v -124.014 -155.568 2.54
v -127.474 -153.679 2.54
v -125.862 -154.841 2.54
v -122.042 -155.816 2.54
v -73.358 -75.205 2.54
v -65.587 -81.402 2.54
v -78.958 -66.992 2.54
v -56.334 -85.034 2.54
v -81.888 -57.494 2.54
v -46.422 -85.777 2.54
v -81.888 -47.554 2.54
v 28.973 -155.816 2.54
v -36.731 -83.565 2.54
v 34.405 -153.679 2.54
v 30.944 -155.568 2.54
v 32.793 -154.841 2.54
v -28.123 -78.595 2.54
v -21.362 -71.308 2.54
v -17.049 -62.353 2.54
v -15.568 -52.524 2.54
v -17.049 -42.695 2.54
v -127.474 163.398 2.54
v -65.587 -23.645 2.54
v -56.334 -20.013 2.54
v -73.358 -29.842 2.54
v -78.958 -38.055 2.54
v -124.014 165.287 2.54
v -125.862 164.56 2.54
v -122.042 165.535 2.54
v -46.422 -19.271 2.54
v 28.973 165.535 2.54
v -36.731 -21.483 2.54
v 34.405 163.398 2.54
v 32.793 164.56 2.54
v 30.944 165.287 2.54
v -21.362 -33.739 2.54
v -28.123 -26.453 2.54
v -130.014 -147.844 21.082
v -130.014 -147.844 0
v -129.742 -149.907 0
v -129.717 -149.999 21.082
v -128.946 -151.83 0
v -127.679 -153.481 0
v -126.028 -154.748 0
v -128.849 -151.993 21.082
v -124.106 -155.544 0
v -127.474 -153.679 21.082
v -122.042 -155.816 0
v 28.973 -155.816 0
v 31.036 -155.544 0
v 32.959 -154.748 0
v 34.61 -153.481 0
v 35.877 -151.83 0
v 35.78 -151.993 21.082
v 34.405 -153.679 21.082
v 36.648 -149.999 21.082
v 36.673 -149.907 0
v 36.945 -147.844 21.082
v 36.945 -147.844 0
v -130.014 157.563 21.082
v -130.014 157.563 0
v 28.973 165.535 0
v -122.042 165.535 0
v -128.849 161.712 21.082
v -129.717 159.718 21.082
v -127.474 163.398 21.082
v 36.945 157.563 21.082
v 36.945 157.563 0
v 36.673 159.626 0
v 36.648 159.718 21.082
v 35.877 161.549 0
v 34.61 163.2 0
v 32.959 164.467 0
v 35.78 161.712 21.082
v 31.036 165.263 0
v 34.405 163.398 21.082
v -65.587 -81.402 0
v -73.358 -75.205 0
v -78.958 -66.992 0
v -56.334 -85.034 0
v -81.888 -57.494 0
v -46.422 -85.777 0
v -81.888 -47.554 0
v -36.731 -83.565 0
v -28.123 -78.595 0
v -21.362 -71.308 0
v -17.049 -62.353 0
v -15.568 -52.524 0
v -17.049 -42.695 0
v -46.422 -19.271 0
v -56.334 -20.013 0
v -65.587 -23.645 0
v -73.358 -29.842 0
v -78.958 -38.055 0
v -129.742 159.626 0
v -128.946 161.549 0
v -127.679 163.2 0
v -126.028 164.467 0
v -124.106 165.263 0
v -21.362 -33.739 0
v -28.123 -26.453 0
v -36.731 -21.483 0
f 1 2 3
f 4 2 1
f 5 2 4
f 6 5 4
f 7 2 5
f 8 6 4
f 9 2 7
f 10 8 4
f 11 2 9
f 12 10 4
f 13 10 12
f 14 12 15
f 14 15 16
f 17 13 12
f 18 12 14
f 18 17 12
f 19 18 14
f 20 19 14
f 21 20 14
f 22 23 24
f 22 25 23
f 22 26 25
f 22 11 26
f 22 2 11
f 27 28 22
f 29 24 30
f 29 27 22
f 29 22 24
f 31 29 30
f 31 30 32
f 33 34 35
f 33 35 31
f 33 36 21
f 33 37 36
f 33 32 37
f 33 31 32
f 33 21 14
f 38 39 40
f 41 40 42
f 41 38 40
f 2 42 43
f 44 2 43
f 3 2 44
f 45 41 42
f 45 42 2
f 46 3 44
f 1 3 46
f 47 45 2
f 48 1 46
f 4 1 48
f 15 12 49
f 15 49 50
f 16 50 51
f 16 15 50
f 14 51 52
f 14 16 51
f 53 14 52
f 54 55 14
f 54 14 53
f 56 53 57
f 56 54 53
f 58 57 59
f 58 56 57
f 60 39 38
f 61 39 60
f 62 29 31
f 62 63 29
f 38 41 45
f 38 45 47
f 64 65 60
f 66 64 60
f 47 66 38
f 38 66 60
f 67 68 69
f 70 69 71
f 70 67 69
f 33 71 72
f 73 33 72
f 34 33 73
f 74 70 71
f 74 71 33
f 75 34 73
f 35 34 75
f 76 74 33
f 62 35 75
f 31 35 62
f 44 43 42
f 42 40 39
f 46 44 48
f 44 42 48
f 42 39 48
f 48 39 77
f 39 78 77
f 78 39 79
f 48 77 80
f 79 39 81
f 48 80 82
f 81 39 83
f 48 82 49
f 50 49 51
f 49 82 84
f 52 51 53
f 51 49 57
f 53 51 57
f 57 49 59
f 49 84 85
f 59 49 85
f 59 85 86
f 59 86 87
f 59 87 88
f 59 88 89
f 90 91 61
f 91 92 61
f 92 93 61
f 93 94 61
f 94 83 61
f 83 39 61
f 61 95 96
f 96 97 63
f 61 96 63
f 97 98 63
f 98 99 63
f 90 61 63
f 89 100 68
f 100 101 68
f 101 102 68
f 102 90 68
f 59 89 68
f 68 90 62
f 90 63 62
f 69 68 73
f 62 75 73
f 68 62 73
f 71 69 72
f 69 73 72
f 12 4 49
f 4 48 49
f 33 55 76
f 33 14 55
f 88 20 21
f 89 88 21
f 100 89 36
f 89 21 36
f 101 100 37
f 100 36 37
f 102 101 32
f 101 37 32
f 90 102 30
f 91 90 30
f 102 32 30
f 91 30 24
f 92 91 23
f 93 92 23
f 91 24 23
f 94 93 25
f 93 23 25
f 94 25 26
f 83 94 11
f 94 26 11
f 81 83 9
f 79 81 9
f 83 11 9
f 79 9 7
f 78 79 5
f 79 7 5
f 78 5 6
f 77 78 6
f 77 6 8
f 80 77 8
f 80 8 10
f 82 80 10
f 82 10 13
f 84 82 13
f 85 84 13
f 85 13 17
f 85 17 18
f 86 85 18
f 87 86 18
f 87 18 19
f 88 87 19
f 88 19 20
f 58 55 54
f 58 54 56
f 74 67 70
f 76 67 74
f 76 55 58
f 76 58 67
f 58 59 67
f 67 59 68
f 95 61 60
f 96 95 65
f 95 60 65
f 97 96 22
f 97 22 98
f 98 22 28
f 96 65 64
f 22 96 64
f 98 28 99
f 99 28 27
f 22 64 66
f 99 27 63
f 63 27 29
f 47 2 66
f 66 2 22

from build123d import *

# Parameters (mm, degrees)
F0_W     = 166.958615
F0_H     = 321.350471
F1_DEPTH = 21.082
F2_T     = -2.54
F3_R     = 7.971733
F4_R     = 7.971733
F5_R     = 33.346223
F6_DEPTH = 145.542


with BuildPart() as f1:
    # F0 (on Top) → F1 (new body)
    with BuildSketch(Plane.XY):
        with Locations((-46.53474, 4.859365)):
            Rectangle(F0_W, F0_H)
    extrude(amount=F1_DEPTH)

    # F2
    f2_openings = [f1.faces().sort_by_distance(p)[0] for p in [
        (-46.534739, 4.859366, 21.082),
        (-46.534739, -155.81587, 10.541),
        (-46.534739, 165.534601, 10.541),
    ]]
    offset(amount=F2_T, openings=f2_openings)

    # F3
    f3_edges = [f1.edges().sort_by_distance(p)[0] for p in [
        (-130.014047, 165.534601, 10.541),
        (36.944568, 165.534601, 10.541),
    ]]
    fillet(f3_edges, radius=F3_R)

    # F4
    f4_edges = [f1.edges().sort_by_distance(p)[0] for p in [
        (36.944568, -155.81587, 10.541),
        (-130.014047, -155.81587, 10.541),
    ]]
    fillet(f4_edges, radius=F4_R)

    # F5 (on face) → F6 (cut)
    with BuildSketch(Plane.XY.offset(2.54)):
        with Locations((-48.913874, -52.523661)):
            Circle(F5_R)
    extrude(amount=-F6_DEPTH, mode=Mode.SUBTRACT)


solid = f1.part
